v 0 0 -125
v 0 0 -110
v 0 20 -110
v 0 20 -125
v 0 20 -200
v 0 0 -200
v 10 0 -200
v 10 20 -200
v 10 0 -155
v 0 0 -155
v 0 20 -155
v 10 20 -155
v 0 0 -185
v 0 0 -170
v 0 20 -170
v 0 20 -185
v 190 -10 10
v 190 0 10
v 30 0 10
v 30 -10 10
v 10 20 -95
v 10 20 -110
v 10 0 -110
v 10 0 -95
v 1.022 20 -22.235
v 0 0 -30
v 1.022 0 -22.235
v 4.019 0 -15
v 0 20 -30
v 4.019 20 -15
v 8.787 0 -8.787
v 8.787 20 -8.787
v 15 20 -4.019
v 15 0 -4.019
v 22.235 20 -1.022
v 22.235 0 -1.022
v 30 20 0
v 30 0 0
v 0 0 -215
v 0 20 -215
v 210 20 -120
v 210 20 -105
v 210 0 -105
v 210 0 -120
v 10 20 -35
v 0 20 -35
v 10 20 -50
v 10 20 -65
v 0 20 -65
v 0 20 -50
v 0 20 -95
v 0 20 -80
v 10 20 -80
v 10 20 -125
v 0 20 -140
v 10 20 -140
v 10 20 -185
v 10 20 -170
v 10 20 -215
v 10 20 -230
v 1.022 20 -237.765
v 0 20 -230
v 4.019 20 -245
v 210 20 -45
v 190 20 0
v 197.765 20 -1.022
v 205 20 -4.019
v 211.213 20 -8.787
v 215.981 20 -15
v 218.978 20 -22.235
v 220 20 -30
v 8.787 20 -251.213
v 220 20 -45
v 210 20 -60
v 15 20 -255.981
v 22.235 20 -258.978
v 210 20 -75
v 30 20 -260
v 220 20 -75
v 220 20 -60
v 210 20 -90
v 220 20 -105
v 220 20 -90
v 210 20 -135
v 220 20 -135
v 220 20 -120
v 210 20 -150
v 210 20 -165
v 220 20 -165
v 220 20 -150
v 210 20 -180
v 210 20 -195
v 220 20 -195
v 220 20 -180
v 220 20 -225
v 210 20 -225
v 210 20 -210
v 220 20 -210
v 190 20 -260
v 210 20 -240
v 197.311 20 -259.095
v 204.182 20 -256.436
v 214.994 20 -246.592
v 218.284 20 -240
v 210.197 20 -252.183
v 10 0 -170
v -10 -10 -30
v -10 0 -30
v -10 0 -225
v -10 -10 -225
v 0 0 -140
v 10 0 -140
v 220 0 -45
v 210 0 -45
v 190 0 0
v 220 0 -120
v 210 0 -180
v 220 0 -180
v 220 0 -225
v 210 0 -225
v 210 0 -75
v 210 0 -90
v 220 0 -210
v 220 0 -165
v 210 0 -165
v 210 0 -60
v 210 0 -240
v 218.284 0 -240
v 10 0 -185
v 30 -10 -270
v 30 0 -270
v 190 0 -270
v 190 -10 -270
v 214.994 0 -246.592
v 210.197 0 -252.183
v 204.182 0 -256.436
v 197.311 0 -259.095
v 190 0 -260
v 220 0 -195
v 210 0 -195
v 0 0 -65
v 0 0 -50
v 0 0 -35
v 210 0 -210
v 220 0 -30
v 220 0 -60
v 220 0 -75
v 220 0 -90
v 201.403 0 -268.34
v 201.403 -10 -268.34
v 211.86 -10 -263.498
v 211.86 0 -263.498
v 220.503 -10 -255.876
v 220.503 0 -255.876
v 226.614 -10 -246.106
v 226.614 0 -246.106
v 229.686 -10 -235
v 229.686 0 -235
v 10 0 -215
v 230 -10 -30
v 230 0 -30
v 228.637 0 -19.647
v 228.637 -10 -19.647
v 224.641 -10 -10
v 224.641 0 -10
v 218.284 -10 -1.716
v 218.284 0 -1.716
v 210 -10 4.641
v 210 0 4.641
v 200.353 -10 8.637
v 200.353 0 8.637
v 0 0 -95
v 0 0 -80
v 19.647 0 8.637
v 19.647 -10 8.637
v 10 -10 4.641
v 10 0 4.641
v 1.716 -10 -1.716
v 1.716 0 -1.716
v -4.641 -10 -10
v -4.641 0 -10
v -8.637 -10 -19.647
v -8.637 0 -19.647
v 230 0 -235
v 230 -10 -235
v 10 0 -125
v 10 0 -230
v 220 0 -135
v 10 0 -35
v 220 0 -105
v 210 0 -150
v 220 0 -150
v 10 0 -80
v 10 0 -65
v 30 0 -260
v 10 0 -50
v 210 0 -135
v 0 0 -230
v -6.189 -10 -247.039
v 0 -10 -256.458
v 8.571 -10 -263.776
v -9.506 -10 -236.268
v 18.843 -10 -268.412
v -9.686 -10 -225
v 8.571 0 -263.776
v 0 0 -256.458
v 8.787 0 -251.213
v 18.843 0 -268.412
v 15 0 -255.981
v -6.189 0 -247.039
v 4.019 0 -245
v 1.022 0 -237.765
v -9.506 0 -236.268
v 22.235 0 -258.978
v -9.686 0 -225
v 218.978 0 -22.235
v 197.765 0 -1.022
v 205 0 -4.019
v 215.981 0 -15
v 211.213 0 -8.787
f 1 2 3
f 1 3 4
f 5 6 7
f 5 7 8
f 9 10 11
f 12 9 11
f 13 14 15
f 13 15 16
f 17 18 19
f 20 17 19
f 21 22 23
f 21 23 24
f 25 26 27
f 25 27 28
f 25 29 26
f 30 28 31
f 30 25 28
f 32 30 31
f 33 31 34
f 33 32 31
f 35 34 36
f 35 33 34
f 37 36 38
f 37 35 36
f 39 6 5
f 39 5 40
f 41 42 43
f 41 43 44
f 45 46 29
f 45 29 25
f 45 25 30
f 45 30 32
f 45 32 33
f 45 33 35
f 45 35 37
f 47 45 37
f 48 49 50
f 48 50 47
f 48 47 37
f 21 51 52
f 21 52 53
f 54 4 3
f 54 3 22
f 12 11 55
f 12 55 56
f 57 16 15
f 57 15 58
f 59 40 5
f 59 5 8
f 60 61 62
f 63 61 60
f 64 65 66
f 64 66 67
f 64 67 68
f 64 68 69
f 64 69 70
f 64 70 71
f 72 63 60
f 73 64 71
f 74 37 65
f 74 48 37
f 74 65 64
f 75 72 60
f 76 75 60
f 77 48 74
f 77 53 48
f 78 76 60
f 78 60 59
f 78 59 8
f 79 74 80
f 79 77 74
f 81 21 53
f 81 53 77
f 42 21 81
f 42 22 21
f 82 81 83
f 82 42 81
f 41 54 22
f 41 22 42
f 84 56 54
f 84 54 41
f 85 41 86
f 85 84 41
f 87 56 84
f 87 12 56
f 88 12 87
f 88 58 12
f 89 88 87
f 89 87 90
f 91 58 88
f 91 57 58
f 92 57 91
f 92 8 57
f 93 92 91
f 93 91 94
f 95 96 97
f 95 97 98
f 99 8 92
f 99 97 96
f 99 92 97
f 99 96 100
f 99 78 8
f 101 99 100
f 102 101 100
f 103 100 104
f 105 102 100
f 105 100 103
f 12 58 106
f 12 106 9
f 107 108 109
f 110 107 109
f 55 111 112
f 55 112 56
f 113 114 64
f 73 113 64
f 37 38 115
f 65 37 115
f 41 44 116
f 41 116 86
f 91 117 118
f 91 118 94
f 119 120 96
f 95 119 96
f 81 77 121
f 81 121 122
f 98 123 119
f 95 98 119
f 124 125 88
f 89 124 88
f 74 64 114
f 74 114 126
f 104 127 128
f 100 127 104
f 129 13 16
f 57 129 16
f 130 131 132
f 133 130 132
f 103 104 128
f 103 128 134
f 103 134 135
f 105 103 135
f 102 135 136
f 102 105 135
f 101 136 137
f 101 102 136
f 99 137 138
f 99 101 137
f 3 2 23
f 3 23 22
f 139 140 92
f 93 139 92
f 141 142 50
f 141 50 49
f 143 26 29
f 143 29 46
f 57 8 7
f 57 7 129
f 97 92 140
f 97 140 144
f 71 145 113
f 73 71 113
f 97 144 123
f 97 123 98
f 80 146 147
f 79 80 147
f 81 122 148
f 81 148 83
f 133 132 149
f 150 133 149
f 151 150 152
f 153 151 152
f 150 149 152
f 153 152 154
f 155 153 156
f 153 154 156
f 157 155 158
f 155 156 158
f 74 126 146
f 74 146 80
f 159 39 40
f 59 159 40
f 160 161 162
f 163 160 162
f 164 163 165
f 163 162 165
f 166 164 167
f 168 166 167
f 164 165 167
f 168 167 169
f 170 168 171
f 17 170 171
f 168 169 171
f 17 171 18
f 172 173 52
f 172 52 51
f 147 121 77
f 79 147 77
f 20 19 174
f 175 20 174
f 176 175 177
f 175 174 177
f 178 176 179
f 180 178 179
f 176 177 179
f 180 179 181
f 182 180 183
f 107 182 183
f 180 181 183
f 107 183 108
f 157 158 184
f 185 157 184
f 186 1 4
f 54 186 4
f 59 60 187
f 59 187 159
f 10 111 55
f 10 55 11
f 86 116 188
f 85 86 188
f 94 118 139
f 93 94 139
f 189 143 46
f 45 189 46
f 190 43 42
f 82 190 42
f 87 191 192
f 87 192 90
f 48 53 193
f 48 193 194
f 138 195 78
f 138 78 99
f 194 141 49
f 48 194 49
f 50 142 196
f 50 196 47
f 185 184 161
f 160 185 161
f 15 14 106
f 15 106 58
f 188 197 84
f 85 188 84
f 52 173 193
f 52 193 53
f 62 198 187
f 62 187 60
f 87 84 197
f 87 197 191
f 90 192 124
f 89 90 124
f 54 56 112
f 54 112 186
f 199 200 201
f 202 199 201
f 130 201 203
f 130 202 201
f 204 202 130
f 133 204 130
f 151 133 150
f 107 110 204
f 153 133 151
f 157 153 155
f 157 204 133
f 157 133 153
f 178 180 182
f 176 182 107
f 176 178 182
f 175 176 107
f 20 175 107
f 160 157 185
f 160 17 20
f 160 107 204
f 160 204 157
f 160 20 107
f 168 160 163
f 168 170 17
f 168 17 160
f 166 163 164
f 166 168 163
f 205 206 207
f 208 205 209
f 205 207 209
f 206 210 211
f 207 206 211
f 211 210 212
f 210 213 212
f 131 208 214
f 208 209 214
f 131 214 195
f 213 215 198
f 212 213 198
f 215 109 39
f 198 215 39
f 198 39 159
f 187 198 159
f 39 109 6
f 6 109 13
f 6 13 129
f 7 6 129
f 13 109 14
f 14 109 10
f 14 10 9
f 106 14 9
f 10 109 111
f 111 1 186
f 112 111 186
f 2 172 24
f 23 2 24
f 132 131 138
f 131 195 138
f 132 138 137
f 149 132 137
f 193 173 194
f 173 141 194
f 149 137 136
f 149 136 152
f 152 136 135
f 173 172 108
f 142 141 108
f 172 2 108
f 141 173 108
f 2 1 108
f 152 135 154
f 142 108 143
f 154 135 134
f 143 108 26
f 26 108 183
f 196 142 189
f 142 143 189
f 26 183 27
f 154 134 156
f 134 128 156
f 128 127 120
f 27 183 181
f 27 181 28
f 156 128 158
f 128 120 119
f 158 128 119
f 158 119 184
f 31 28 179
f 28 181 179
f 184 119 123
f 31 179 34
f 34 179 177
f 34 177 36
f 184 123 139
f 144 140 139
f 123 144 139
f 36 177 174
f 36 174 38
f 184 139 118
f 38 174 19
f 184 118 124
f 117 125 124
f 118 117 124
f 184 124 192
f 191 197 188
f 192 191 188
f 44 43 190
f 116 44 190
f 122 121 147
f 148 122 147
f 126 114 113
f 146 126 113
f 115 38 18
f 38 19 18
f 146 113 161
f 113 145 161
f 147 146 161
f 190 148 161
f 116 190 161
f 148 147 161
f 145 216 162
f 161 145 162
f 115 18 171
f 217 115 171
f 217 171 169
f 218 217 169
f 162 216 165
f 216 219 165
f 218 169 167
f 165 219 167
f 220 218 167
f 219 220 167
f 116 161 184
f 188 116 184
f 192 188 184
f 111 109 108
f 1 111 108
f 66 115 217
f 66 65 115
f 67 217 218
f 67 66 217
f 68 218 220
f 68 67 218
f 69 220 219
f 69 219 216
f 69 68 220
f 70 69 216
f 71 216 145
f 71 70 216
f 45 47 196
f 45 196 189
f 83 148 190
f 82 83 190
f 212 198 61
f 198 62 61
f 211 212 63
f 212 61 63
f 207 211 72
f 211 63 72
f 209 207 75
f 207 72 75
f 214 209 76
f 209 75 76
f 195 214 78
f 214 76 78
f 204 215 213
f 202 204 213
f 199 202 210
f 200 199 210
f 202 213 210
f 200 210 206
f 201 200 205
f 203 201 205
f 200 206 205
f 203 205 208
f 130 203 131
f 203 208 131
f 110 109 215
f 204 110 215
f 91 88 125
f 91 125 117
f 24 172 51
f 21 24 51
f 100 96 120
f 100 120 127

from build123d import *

# Parameters (mm, degrees)
SKETCH1_W              = 220
SKETCH1_H              = 260
BOSS_EXTRUDE1_DEPTH    = 20
FILLET1_R              = 30
CUT_EXTRUDE1_START     = -10
CUT_EXTRUDE1_OUTLINE_W = 15
CUT_EXTRUDE1_OUTLINE_H = 20
CUT_EXTRUDE1_DEPTH     = 10
SKETCH8_W              = 15
SKETCH8_H              = 20
CUT_EXTRUDE2_DEPTH     = 10
BOSS_EXTRUDE3_DEPTH    = 10


# Read off the part's stored shape, not the designer's step: Cut-Extrude1
with BuildPart() as part:
    # Sketch1 → Boss-Extrude1 (new body)
    with BuildSketch(Plane(origin=(0, 0, 0), x_dir=(1, 0, 0), z_dir=(0, 1, 0))):
        with Locations((110, 130)):
            Rectangle(SKETCH1_W, SKETCH1_H)
    extrude(amount=BOSS_EXTRUDE1_DEPTH)

    # Fillet1
    fillet1_edges = [part.edges().sort_by_distance(p)[0] for p in [
        (0, 10, -260),
        (220, 10, -260),
        (220, 10, 0),
        (0, 10, 0),
    ]]
    fillet(fillet1_edges, radius=FILLET1_R)

    # Cut-Extrude1 outline → Cut-Extrude1 (cut)
    with BuildSketch(Plane(origin=(220, 0, 0), x_dir=(0, 0, -1), z_dir=(1, 0, 0)).offset(CUT_EXTRUDE1_START)):
        with Locations((232.5, 10)):
            Rectangle(CUT_EXTRUDE1_OUTLINE_W, CUT_EXTRUDE1_OUTLINE_H)
        with Locations((202.5, 10)):
            Rectangle(CUT_EXTRUDE1_OUTLINE_W, CUT_EXTRUDE1_OUTLINE_H)
        with Locations((172.5, 10)):
            Rectangle(CUT_EXTRUDE1_OUTLINE_W, CUT_EXTRUDE1_OUTLINE_H)
        with Locations((142.5, 10)):
            Rectangle(CUT_EXTRUDE1_OUTLINE_W, CUT_EXTRUDE1_OUTLINE_H)
        with Locations((112.5, 10)):
            Rectangle(CUT_EXTRUDE1_OUTLINE_W, CUT_EXTRUDE1_OUTLINE_H)
        with Locations((82.5, 10)):
            Rectangle(CUT_EXTRUDE1_OUTLINE_W, CUT_EXTRUDE1_OUTLINE_H)
        with Locations((52.5, 10)):
            Rectangle(CUT_EXTRUDE1_OUTLINE_W, CUT_EXTRUDE1_OUTLINE_H)
    extrude(amount=CUT_EXTRUDE1_DEPTH, mode=Mode.SUBTRACT)

    # Sketch8 → Cut-Extrude2 (cut)
    with BuildSketch(Plane.ZY):
        with Locations((-222.5, 10)):
            Rectangle(SKETCH8_W, SKETCH8_H)
        with Locations((-192.5, 10)):
            Rectangle(SKETCH8_W, SKETCH8_H)
        with Locations((-162.5, 10)):
            Rectangle(SKETCH8_W, SKETCH8_H)
        with Locations((-132.5, 10)):
            Rectangle(SKETCH8_W, SKETCH8_H)
        with Locations((-102.5, 10)):
            Rectangle(SKETCH8_W, SKETCH8_H)
        with Locations((-72.5, 10)):
            Rectangle(SKETCH8_W, SKETCH8_H)
        with Locations((-42.5, 10)):
            Rectangle(SKETCH8_W, SKETCH8_H)
    extrude(amount=-CUT_EXTRUDE2_DEPTH, mode=Mode.SUBTRACT)

    # Sketch11 → Boss-Extrude3 (add)
    with BuildSketch(Plane.XZ):
        with BuildLine():
            Line((229.686269666, -235), (230, -235))
            Line((230, -235), (230, -30))
            ThreePointArc((230, -30), (218.284271247, -1.715728753), (190, 10))
            Line((190, 10), (30, 10))
            ThreePointArc((30, 10), (1.715728753, -1.715728753), (-10, -30))
            Line((-10, -30), (-10, -225))
            Line((-10, -225), (-9.686269666, -225))
            ThreePointArc((-9.686269666, -225), (0, -256.457513111), (30, -270))
            Line((30, -270), (190, -270))
            ThreePointArc((190, -270), (216.457513111, -260), (229.686269666, -235))
        make_face()
    extrude(amount=BOSS_EXTRUDE3_DEPTH)


solid = part.part
